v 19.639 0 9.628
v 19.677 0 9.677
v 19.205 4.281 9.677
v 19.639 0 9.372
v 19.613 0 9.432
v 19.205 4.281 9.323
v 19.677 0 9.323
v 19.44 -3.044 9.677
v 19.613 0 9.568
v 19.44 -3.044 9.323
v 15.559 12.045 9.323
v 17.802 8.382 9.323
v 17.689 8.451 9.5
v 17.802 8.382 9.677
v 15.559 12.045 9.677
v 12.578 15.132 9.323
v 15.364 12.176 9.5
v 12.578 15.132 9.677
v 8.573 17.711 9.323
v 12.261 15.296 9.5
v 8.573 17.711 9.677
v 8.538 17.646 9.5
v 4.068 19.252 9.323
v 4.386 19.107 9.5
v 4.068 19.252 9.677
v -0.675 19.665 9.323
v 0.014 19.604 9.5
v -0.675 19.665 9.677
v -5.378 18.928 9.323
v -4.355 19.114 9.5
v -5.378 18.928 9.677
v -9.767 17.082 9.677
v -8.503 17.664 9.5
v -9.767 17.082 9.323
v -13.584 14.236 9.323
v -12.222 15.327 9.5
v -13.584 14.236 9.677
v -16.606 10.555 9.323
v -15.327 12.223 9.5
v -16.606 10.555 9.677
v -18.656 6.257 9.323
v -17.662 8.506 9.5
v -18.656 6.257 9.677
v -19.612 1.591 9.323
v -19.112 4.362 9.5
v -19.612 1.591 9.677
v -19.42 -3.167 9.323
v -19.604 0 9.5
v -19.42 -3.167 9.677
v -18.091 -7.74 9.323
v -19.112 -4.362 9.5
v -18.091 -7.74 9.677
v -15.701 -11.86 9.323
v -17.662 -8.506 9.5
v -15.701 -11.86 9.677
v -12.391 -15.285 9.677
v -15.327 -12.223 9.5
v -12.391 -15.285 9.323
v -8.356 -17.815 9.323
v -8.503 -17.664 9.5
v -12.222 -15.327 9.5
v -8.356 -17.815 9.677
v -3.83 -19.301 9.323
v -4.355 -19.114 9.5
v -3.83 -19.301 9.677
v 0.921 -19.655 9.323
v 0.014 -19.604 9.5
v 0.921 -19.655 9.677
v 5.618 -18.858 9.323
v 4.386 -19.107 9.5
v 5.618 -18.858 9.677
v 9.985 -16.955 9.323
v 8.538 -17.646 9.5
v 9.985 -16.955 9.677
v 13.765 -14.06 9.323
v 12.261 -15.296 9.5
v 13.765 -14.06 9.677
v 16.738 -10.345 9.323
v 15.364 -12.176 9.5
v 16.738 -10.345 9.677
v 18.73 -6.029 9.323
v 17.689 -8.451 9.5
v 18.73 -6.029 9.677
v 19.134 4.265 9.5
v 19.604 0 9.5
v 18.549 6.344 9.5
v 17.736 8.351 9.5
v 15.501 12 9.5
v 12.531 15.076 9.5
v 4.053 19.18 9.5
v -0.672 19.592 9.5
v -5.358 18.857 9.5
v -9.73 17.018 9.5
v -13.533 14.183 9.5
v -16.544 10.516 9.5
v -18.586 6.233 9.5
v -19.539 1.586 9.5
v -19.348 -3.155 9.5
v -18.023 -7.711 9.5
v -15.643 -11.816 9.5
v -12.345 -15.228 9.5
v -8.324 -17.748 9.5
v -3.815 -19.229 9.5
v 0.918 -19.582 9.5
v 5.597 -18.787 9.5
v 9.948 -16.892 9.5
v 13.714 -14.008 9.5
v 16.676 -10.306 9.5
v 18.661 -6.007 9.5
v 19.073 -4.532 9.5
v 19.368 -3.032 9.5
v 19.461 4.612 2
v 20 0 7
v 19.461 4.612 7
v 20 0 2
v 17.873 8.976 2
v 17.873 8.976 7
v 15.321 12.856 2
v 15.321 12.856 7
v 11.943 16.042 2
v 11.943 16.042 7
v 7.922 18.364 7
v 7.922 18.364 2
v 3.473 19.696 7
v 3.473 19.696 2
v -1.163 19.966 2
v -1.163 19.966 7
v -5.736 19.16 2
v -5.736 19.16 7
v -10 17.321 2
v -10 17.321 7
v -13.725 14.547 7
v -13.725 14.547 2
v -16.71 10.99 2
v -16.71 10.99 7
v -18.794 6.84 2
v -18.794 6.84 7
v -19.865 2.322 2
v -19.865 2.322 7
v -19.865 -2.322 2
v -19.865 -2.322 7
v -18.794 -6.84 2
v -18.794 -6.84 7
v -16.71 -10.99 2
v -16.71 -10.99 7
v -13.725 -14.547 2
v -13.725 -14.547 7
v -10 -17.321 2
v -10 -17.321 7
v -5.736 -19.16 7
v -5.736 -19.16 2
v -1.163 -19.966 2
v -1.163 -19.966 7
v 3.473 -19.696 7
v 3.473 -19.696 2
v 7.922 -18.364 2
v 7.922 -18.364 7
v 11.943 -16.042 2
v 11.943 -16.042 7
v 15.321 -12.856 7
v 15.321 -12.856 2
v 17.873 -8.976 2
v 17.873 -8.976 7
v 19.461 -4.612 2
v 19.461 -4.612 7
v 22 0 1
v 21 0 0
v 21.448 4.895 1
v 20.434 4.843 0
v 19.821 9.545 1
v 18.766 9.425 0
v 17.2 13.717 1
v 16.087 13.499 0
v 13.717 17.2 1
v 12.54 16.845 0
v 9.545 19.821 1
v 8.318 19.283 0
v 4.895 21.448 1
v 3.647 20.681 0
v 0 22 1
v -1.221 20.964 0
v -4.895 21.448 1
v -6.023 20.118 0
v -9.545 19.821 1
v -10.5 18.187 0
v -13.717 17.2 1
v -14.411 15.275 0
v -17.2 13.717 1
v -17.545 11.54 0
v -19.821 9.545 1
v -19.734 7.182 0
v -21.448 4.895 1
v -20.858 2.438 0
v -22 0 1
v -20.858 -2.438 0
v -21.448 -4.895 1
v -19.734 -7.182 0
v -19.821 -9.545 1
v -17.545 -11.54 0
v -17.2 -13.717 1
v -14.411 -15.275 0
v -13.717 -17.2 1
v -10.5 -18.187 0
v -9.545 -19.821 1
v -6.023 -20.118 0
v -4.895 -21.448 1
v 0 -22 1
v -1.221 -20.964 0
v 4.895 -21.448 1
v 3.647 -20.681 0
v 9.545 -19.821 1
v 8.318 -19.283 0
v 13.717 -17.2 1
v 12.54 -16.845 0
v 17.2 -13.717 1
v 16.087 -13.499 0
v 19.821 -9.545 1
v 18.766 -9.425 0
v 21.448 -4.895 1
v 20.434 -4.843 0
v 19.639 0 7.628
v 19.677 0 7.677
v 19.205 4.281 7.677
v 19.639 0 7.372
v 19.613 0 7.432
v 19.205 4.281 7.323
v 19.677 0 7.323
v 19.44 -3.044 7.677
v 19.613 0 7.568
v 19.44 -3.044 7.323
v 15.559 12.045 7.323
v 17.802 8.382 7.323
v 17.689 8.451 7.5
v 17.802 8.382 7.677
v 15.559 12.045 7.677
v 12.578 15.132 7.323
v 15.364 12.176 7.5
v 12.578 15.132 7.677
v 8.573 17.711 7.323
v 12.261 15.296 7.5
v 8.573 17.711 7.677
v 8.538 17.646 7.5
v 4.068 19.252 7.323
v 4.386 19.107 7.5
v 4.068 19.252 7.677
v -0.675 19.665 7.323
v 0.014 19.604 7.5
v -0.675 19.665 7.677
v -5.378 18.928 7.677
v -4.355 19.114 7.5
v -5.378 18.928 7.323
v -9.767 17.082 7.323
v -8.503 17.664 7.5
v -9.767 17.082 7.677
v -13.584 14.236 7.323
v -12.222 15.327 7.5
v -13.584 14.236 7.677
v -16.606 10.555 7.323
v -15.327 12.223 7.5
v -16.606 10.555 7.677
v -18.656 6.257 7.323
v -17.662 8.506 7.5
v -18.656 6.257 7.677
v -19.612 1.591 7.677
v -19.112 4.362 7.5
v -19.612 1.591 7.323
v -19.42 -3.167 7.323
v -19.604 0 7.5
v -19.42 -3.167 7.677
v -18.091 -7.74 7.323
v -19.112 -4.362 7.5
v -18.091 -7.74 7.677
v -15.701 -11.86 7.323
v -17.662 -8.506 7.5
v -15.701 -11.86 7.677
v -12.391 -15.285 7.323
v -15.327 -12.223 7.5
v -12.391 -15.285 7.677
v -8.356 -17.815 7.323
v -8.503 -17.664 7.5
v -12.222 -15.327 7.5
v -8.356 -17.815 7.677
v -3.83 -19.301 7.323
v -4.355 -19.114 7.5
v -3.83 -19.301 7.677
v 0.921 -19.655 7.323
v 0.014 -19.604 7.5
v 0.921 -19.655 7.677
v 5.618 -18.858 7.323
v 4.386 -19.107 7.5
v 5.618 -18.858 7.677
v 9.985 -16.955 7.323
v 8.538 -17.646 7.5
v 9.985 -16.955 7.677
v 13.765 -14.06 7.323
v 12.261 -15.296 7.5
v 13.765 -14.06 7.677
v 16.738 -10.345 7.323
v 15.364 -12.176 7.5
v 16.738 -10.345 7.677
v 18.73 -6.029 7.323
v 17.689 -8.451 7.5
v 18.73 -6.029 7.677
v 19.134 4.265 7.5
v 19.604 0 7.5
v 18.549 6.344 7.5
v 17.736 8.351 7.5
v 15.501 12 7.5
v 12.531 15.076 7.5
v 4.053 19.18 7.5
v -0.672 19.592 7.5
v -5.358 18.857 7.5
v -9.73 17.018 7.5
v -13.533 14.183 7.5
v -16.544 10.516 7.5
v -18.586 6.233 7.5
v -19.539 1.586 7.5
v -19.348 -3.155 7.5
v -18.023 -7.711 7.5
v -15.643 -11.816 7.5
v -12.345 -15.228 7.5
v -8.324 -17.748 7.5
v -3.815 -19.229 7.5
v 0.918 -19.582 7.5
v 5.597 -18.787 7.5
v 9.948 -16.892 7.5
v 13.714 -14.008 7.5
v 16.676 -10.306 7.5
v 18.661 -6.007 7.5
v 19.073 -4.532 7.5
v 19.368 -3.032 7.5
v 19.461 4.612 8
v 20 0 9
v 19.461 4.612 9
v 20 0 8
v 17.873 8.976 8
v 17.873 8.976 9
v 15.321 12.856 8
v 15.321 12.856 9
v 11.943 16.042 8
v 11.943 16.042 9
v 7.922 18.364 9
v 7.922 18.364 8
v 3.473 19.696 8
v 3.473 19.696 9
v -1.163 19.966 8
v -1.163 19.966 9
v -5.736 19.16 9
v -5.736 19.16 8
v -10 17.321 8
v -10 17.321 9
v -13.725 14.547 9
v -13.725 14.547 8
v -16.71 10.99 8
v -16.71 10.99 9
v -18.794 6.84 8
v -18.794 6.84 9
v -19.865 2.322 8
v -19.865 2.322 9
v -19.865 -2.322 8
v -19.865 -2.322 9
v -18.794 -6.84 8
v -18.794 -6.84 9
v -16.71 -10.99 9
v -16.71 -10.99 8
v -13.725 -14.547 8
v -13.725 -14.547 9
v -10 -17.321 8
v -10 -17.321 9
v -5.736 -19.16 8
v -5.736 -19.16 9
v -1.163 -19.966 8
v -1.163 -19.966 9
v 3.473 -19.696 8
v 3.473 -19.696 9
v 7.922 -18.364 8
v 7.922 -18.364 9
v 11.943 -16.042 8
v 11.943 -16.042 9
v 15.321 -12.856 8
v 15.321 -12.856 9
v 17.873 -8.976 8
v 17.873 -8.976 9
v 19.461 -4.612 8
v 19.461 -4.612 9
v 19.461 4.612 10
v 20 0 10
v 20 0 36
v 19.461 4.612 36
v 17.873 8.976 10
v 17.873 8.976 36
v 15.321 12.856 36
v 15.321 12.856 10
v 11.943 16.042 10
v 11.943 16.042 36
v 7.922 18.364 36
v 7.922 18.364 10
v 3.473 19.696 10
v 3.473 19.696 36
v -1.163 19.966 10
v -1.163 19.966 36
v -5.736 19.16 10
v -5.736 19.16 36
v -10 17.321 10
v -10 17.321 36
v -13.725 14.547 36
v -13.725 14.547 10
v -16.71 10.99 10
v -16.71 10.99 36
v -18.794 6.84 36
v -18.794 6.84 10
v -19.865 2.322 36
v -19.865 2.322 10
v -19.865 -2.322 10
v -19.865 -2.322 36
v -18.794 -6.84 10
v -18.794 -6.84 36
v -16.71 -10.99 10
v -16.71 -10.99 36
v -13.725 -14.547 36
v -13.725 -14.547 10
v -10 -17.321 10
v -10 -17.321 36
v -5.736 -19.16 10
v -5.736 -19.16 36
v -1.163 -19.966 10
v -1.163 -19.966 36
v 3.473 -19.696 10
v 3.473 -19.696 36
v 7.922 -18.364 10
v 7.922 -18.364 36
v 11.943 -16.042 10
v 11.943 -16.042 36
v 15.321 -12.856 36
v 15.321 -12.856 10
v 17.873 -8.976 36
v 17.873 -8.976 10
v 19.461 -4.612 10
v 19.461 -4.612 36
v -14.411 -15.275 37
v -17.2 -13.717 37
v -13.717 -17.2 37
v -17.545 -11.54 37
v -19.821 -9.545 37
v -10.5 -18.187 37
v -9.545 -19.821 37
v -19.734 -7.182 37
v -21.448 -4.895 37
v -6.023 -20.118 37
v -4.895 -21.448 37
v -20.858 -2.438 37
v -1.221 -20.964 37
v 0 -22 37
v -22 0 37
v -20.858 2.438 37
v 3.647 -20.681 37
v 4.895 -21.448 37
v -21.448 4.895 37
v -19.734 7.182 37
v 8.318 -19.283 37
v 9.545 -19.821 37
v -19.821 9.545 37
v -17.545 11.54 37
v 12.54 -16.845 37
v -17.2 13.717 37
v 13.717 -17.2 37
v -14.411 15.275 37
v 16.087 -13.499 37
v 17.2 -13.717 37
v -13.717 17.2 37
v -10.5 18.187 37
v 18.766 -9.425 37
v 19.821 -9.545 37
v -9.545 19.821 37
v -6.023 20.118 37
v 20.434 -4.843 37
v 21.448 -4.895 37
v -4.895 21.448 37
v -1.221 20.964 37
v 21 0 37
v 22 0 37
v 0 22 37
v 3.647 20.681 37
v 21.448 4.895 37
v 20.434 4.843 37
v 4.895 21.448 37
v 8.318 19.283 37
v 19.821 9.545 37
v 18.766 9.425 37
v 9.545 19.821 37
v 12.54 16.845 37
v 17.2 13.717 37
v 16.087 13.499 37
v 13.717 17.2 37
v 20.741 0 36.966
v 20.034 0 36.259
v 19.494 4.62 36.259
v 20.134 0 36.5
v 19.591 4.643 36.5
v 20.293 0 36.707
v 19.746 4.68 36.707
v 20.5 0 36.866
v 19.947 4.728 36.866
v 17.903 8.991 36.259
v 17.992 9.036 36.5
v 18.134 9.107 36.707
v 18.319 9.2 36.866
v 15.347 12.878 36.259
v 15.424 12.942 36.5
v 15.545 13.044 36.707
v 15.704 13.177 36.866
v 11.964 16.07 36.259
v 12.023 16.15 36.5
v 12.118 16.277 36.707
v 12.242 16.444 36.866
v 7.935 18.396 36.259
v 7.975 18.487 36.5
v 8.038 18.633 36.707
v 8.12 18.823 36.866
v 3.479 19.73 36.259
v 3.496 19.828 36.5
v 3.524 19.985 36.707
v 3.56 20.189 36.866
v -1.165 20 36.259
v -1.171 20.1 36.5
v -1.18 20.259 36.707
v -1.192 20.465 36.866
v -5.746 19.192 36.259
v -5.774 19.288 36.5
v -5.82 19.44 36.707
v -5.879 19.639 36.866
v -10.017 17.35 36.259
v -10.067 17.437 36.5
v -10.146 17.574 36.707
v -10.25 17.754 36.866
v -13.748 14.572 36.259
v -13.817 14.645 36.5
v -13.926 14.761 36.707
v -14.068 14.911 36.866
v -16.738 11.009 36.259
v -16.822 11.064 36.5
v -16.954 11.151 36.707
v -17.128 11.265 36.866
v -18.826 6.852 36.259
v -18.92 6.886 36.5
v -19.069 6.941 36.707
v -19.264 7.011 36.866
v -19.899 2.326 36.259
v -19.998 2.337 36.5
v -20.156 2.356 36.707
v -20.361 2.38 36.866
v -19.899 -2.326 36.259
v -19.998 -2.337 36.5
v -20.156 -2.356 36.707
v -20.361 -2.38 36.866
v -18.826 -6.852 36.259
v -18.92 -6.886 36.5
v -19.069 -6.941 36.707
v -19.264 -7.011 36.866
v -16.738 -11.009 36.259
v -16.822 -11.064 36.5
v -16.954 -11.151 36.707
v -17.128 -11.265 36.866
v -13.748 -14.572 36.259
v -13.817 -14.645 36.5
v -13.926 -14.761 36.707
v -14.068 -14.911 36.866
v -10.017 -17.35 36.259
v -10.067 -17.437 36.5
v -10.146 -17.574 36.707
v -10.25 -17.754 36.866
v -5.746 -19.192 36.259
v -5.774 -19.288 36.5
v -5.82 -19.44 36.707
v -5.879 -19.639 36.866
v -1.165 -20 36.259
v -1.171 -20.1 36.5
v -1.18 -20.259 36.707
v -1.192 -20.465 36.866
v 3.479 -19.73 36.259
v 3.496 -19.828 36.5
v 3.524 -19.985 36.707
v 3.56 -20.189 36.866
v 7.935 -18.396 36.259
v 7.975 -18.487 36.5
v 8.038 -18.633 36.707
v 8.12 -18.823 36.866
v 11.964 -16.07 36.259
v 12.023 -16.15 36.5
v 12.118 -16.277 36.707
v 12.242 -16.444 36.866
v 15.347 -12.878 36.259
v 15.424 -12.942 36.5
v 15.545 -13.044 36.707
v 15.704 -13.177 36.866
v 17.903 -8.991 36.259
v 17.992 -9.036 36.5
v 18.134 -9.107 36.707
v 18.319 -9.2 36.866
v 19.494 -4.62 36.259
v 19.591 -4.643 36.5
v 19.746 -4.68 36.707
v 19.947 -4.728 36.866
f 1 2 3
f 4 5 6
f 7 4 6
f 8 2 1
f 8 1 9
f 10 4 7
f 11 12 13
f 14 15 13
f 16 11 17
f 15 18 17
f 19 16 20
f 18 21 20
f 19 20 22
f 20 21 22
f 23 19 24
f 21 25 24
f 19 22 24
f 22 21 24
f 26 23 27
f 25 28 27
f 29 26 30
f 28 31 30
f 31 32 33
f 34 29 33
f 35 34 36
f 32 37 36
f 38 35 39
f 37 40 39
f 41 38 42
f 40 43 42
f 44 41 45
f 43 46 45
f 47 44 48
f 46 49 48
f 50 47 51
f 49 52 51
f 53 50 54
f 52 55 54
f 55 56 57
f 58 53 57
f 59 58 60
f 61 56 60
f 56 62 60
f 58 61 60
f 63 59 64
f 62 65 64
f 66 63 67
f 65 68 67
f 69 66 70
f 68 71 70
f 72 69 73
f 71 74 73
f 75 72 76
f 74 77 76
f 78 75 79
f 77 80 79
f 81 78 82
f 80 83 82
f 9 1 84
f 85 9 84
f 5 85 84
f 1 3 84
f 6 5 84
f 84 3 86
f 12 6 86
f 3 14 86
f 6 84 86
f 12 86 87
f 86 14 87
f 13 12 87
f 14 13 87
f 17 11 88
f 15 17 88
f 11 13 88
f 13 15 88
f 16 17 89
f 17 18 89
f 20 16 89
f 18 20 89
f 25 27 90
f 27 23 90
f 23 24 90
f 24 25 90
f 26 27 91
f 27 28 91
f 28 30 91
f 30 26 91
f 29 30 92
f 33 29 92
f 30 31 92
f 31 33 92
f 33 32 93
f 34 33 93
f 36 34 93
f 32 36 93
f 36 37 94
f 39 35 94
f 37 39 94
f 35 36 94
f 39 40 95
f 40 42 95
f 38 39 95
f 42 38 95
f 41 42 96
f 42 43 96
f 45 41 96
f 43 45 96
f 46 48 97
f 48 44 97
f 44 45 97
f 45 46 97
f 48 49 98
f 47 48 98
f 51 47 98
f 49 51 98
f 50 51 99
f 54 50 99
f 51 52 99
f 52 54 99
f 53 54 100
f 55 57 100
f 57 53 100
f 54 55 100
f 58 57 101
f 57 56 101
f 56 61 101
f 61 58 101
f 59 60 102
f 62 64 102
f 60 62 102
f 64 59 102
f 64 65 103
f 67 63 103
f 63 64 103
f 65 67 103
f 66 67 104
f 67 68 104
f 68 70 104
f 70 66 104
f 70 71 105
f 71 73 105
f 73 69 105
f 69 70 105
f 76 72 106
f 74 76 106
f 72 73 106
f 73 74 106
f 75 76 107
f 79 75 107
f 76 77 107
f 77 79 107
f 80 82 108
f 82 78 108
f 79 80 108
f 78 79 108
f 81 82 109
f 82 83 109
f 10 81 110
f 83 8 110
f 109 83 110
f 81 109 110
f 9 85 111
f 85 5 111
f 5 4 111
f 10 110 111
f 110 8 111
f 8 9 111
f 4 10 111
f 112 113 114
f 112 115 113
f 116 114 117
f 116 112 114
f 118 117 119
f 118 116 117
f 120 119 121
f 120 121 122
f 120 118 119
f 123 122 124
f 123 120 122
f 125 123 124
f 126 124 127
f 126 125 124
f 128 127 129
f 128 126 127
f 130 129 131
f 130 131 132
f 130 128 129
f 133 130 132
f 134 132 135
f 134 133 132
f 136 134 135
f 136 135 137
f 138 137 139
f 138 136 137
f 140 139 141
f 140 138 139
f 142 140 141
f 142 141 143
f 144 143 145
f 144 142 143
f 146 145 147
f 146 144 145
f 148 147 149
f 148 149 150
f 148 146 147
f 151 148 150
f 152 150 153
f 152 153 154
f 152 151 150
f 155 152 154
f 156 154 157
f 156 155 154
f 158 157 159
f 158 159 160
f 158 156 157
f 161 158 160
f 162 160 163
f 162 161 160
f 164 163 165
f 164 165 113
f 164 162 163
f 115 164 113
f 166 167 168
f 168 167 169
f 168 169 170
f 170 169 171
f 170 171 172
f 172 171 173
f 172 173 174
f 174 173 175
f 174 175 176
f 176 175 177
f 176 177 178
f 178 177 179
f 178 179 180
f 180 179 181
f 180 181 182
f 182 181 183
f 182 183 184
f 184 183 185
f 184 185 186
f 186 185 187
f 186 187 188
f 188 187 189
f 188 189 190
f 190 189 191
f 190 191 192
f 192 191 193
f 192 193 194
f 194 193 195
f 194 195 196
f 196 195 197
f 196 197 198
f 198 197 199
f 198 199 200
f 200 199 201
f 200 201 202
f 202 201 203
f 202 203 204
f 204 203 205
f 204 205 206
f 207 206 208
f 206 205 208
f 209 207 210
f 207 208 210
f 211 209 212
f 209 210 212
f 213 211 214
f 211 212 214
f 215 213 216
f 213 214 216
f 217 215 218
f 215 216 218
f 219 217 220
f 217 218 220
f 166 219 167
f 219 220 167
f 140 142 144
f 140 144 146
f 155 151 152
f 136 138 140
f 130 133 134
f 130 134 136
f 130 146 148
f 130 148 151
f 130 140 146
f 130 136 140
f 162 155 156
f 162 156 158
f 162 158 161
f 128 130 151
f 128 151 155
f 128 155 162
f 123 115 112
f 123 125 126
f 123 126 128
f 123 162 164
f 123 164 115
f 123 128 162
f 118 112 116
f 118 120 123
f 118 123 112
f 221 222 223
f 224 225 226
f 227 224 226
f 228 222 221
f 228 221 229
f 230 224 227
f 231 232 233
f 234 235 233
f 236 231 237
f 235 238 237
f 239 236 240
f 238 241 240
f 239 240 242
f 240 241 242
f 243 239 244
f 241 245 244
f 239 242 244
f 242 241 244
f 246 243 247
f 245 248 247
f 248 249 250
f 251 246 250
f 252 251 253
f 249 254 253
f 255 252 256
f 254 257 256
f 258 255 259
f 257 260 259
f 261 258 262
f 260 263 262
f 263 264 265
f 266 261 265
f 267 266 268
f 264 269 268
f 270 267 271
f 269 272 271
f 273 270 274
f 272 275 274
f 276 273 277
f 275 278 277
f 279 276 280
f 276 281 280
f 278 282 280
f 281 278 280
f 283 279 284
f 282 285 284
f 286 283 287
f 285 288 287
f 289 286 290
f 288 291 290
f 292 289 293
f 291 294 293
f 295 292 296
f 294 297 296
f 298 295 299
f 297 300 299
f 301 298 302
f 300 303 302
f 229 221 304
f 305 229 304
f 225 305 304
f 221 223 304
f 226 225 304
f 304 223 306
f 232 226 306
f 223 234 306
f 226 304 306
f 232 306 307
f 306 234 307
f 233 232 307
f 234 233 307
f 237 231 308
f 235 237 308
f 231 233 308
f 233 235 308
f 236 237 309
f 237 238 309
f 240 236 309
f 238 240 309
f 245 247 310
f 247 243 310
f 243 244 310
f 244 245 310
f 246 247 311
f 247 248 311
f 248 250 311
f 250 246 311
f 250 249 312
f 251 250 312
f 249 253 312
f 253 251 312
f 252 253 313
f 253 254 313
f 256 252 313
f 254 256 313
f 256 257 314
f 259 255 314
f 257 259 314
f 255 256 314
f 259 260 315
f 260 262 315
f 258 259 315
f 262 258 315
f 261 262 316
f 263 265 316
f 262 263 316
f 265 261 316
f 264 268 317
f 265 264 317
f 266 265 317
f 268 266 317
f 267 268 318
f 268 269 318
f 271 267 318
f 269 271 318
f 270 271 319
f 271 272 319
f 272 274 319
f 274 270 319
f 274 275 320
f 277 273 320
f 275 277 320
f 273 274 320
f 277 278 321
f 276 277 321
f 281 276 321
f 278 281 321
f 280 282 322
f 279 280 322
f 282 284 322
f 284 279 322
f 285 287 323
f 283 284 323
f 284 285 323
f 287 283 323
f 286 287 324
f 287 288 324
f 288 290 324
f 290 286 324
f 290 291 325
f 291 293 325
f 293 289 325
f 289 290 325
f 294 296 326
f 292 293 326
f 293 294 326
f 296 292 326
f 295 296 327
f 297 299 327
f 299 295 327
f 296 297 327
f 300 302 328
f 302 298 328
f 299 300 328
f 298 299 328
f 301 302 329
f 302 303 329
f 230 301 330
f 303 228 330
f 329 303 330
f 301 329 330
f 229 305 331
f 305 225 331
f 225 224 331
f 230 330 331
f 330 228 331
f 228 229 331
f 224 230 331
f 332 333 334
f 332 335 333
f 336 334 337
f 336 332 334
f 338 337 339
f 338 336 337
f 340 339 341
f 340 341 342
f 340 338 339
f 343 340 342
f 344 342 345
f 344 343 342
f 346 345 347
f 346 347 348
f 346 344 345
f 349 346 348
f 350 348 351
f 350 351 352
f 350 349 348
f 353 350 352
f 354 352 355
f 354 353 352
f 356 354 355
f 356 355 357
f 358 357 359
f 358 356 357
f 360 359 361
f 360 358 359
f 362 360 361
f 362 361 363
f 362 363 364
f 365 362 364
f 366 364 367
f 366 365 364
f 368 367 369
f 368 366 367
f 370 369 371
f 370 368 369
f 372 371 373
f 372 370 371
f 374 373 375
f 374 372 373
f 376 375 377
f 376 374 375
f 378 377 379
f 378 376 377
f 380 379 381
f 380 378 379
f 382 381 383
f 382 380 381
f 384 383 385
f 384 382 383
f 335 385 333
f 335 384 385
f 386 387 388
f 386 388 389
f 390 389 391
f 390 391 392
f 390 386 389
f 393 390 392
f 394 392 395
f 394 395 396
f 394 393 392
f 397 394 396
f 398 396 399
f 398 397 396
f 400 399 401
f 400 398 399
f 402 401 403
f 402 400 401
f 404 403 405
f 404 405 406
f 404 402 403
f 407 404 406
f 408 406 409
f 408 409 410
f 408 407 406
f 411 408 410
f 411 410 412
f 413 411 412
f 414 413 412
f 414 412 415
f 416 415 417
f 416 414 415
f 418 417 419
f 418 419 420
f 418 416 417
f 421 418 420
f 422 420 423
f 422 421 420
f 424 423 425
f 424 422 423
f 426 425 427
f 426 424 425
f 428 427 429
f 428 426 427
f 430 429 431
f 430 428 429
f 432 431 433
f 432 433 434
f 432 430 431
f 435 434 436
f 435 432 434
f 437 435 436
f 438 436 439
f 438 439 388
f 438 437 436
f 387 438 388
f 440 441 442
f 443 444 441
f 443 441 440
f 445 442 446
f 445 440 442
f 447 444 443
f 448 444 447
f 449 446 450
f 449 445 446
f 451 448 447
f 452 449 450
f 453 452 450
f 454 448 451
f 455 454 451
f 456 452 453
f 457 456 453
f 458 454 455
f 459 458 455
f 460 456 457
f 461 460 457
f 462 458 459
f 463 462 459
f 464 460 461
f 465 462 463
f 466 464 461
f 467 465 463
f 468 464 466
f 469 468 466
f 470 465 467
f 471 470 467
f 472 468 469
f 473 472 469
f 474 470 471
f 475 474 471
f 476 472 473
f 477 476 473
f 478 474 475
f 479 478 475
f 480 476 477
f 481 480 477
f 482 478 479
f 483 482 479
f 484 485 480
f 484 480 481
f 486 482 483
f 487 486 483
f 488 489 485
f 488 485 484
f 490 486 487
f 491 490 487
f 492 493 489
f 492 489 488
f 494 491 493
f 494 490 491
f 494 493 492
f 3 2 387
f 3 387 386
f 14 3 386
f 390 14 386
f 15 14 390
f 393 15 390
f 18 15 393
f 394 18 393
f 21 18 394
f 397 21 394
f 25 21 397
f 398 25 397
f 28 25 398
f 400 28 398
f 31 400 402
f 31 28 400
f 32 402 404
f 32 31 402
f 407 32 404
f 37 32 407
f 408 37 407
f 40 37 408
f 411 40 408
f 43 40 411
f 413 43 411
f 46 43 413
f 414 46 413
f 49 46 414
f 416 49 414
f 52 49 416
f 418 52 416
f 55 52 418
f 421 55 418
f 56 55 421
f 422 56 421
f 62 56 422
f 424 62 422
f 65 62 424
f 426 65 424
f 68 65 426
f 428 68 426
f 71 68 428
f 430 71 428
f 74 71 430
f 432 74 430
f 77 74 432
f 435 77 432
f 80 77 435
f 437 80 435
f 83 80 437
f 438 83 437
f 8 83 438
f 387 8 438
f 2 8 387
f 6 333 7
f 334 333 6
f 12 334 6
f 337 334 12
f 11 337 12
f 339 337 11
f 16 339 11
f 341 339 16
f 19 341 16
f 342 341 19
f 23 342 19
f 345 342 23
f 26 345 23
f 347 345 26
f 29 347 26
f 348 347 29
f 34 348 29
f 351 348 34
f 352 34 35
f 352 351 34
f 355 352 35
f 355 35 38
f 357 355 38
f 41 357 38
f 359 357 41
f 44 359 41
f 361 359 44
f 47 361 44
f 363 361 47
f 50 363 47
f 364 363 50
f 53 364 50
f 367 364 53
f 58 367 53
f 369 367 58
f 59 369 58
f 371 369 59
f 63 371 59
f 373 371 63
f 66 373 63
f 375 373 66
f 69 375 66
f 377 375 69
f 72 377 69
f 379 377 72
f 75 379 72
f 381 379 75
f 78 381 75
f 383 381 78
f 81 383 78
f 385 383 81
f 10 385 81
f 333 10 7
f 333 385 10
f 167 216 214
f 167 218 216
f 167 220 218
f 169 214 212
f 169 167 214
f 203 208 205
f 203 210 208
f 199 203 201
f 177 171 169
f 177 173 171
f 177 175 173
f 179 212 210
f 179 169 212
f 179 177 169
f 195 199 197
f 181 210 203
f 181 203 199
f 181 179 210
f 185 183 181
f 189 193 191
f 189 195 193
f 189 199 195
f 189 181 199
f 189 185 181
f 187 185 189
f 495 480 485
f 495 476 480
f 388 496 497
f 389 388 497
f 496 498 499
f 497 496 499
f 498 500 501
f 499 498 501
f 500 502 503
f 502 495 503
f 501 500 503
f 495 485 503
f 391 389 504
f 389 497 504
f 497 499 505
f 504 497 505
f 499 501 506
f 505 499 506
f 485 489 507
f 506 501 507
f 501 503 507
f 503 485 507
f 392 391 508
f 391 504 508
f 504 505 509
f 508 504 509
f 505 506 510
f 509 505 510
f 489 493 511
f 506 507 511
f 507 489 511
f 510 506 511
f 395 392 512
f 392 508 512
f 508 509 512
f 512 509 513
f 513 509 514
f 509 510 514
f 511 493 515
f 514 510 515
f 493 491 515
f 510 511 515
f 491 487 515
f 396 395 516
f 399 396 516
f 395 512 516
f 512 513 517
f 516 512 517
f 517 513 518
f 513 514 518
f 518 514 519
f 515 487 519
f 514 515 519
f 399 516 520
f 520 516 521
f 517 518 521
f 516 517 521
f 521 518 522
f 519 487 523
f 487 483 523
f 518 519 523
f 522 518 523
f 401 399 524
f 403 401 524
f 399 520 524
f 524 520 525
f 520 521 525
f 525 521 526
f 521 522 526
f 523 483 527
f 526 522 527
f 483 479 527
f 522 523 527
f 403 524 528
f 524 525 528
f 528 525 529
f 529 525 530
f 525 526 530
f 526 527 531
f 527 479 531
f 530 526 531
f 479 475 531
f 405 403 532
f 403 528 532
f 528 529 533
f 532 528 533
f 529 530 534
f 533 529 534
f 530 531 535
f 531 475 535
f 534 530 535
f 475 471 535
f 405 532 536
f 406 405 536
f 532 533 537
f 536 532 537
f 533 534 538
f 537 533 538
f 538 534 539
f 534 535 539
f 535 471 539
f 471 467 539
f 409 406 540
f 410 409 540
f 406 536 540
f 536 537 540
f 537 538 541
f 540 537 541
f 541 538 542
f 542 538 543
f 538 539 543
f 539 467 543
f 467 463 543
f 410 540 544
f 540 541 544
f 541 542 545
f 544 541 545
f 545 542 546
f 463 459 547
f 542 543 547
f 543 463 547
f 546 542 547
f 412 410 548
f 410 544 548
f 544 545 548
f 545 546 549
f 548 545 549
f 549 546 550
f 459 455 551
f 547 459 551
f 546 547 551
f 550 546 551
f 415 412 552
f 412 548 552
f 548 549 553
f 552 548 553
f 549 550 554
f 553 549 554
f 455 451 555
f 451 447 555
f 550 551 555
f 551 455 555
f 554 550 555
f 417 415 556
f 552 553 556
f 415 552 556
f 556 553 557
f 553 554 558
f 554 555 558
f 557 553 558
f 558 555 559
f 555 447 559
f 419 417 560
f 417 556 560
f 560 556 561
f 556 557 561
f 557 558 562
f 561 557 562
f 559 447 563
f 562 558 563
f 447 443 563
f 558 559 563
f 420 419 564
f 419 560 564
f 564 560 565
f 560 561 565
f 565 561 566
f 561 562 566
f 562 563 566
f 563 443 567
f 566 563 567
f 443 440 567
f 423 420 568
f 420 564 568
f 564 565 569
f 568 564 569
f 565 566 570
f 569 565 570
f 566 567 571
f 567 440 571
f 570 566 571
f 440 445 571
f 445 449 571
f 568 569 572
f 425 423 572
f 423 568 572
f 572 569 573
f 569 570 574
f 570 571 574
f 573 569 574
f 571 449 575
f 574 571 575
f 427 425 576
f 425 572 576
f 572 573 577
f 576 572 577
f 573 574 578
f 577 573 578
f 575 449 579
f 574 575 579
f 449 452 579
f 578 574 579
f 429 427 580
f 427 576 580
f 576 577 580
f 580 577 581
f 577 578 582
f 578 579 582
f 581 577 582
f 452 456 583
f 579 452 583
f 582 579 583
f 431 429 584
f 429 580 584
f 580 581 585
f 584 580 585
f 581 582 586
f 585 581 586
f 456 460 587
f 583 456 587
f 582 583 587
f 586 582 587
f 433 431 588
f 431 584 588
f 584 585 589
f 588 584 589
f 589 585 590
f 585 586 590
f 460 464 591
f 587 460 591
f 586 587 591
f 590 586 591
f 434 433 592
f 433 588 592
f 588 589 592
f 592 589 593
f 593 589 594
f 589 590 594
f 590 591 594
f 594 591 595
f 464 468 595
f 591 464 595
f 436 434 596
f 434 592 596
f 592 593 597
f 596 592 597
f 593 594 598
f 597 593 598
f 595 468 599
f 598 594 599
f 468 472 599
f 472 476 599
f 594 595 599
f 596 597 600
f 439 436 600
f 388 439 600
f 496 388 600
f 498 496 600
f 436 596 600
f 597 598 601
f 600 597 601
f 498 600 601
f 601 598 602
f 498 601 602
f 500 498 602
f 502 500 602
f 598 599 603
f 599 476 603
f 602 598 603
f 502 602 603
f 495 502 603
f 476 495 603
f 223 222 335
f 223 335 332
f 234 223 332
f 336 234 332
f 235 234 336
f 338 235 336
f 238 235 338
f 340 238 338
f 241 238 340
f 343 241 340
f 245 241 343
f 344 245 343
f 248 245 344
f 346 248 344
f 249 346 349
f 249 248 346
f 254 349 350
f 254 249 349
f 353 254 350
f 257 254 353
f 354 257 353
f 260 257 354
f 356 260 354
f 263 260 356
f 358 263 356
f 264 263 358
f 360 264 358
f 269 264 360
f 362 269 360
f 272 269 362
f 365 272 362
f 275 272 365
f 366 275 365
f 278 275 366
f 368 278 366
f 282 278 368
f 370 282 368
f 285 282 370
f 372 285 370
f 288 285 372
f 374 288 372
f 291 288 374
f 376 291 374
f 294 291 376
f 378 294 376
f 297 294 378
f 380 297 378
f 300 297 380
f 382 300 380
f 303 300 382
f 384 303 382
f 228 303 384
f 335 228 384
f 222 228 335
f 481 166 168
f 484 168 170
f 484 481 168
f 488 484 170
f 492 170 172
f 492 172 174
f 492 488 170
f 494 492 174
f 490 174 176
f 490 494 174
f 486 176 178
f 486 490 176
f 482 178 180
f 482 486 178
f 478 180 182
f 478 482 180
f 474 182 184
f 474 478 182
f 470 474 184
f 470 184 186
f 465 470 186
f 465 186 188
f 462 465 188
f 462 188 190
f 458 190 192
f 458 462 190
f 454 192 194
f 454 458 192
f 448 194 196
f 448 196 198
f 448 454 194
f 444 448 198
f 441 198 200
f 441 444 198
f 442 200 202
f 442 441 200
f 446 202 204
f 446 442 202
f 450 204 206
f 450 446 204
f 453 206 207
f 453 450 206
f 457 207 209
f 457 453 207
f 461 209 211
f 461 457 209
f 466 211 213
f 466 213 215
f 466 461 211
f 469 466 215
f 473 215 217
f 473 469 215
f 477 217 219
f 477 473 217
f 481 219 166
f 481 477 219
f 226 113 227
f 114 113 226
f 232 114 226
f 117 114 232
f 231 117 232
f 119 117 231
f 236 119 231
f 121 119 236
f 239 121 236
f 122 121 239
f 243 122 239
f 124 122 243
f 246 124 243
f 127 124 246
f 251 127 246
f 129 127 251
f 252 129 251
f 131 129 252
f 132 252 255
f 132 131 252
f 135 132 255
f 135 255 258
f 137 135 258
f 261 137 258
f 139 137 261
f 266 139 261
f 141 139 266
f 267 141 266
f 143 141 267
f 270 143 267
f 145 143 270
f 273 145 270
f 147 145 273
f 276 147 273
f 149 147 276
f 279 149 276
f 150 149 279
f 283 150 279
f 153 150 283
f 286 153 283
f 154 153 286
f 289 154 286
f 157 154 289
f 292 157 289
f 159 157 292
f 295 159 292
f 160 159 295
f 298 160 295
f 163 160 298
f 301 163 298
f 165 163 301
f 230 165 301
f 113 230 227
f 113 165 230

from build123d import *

# Parameters (mm, degrees)
FILLET_R     = 0.25
FILLET001_R  = 1
CHAMFER_SIZE = 1


with BuildPart() as part:
    # Sketch → Revolution (revolve)
    with BuildSketch(Plane.XZ):
        Polygon((22, 0), (22, 37), (20, 37), (20, 10), (19.5, 9.5), (20, 9), (20, 8), (19.5, 7.5), (20, 7), (20, 2), (0, 2), (0, 0), align=None)
    revolve(axis=Axis((0, 0, 0), (0, 0, 1)))

    # Fillet
    fillet_edges = [part.edges().sort_by_distance(p)[0] for p in [
        (-19.5, 0, 7.5),
        (-19.5, 0, 9.5),
    ]]
    fillet(fillet_edges, radius=FILLET_R)

    # Fillet001
    fillet001_edges = [part.edges().sort_by_distance(p)[0] for p in [
        (-20, 0, 37),
    ]]
    fillet(fillet001_edges, radius=FILLET001_R)

    # Chamfer
    chamfer_edges = [part.edges().sort_by_distance(p)[0] for p in [
        (-22, 0, 0),
    ]]
    chamfer(chamfer_edges, length=CHAMFER_SIZE)


solid = part.part
